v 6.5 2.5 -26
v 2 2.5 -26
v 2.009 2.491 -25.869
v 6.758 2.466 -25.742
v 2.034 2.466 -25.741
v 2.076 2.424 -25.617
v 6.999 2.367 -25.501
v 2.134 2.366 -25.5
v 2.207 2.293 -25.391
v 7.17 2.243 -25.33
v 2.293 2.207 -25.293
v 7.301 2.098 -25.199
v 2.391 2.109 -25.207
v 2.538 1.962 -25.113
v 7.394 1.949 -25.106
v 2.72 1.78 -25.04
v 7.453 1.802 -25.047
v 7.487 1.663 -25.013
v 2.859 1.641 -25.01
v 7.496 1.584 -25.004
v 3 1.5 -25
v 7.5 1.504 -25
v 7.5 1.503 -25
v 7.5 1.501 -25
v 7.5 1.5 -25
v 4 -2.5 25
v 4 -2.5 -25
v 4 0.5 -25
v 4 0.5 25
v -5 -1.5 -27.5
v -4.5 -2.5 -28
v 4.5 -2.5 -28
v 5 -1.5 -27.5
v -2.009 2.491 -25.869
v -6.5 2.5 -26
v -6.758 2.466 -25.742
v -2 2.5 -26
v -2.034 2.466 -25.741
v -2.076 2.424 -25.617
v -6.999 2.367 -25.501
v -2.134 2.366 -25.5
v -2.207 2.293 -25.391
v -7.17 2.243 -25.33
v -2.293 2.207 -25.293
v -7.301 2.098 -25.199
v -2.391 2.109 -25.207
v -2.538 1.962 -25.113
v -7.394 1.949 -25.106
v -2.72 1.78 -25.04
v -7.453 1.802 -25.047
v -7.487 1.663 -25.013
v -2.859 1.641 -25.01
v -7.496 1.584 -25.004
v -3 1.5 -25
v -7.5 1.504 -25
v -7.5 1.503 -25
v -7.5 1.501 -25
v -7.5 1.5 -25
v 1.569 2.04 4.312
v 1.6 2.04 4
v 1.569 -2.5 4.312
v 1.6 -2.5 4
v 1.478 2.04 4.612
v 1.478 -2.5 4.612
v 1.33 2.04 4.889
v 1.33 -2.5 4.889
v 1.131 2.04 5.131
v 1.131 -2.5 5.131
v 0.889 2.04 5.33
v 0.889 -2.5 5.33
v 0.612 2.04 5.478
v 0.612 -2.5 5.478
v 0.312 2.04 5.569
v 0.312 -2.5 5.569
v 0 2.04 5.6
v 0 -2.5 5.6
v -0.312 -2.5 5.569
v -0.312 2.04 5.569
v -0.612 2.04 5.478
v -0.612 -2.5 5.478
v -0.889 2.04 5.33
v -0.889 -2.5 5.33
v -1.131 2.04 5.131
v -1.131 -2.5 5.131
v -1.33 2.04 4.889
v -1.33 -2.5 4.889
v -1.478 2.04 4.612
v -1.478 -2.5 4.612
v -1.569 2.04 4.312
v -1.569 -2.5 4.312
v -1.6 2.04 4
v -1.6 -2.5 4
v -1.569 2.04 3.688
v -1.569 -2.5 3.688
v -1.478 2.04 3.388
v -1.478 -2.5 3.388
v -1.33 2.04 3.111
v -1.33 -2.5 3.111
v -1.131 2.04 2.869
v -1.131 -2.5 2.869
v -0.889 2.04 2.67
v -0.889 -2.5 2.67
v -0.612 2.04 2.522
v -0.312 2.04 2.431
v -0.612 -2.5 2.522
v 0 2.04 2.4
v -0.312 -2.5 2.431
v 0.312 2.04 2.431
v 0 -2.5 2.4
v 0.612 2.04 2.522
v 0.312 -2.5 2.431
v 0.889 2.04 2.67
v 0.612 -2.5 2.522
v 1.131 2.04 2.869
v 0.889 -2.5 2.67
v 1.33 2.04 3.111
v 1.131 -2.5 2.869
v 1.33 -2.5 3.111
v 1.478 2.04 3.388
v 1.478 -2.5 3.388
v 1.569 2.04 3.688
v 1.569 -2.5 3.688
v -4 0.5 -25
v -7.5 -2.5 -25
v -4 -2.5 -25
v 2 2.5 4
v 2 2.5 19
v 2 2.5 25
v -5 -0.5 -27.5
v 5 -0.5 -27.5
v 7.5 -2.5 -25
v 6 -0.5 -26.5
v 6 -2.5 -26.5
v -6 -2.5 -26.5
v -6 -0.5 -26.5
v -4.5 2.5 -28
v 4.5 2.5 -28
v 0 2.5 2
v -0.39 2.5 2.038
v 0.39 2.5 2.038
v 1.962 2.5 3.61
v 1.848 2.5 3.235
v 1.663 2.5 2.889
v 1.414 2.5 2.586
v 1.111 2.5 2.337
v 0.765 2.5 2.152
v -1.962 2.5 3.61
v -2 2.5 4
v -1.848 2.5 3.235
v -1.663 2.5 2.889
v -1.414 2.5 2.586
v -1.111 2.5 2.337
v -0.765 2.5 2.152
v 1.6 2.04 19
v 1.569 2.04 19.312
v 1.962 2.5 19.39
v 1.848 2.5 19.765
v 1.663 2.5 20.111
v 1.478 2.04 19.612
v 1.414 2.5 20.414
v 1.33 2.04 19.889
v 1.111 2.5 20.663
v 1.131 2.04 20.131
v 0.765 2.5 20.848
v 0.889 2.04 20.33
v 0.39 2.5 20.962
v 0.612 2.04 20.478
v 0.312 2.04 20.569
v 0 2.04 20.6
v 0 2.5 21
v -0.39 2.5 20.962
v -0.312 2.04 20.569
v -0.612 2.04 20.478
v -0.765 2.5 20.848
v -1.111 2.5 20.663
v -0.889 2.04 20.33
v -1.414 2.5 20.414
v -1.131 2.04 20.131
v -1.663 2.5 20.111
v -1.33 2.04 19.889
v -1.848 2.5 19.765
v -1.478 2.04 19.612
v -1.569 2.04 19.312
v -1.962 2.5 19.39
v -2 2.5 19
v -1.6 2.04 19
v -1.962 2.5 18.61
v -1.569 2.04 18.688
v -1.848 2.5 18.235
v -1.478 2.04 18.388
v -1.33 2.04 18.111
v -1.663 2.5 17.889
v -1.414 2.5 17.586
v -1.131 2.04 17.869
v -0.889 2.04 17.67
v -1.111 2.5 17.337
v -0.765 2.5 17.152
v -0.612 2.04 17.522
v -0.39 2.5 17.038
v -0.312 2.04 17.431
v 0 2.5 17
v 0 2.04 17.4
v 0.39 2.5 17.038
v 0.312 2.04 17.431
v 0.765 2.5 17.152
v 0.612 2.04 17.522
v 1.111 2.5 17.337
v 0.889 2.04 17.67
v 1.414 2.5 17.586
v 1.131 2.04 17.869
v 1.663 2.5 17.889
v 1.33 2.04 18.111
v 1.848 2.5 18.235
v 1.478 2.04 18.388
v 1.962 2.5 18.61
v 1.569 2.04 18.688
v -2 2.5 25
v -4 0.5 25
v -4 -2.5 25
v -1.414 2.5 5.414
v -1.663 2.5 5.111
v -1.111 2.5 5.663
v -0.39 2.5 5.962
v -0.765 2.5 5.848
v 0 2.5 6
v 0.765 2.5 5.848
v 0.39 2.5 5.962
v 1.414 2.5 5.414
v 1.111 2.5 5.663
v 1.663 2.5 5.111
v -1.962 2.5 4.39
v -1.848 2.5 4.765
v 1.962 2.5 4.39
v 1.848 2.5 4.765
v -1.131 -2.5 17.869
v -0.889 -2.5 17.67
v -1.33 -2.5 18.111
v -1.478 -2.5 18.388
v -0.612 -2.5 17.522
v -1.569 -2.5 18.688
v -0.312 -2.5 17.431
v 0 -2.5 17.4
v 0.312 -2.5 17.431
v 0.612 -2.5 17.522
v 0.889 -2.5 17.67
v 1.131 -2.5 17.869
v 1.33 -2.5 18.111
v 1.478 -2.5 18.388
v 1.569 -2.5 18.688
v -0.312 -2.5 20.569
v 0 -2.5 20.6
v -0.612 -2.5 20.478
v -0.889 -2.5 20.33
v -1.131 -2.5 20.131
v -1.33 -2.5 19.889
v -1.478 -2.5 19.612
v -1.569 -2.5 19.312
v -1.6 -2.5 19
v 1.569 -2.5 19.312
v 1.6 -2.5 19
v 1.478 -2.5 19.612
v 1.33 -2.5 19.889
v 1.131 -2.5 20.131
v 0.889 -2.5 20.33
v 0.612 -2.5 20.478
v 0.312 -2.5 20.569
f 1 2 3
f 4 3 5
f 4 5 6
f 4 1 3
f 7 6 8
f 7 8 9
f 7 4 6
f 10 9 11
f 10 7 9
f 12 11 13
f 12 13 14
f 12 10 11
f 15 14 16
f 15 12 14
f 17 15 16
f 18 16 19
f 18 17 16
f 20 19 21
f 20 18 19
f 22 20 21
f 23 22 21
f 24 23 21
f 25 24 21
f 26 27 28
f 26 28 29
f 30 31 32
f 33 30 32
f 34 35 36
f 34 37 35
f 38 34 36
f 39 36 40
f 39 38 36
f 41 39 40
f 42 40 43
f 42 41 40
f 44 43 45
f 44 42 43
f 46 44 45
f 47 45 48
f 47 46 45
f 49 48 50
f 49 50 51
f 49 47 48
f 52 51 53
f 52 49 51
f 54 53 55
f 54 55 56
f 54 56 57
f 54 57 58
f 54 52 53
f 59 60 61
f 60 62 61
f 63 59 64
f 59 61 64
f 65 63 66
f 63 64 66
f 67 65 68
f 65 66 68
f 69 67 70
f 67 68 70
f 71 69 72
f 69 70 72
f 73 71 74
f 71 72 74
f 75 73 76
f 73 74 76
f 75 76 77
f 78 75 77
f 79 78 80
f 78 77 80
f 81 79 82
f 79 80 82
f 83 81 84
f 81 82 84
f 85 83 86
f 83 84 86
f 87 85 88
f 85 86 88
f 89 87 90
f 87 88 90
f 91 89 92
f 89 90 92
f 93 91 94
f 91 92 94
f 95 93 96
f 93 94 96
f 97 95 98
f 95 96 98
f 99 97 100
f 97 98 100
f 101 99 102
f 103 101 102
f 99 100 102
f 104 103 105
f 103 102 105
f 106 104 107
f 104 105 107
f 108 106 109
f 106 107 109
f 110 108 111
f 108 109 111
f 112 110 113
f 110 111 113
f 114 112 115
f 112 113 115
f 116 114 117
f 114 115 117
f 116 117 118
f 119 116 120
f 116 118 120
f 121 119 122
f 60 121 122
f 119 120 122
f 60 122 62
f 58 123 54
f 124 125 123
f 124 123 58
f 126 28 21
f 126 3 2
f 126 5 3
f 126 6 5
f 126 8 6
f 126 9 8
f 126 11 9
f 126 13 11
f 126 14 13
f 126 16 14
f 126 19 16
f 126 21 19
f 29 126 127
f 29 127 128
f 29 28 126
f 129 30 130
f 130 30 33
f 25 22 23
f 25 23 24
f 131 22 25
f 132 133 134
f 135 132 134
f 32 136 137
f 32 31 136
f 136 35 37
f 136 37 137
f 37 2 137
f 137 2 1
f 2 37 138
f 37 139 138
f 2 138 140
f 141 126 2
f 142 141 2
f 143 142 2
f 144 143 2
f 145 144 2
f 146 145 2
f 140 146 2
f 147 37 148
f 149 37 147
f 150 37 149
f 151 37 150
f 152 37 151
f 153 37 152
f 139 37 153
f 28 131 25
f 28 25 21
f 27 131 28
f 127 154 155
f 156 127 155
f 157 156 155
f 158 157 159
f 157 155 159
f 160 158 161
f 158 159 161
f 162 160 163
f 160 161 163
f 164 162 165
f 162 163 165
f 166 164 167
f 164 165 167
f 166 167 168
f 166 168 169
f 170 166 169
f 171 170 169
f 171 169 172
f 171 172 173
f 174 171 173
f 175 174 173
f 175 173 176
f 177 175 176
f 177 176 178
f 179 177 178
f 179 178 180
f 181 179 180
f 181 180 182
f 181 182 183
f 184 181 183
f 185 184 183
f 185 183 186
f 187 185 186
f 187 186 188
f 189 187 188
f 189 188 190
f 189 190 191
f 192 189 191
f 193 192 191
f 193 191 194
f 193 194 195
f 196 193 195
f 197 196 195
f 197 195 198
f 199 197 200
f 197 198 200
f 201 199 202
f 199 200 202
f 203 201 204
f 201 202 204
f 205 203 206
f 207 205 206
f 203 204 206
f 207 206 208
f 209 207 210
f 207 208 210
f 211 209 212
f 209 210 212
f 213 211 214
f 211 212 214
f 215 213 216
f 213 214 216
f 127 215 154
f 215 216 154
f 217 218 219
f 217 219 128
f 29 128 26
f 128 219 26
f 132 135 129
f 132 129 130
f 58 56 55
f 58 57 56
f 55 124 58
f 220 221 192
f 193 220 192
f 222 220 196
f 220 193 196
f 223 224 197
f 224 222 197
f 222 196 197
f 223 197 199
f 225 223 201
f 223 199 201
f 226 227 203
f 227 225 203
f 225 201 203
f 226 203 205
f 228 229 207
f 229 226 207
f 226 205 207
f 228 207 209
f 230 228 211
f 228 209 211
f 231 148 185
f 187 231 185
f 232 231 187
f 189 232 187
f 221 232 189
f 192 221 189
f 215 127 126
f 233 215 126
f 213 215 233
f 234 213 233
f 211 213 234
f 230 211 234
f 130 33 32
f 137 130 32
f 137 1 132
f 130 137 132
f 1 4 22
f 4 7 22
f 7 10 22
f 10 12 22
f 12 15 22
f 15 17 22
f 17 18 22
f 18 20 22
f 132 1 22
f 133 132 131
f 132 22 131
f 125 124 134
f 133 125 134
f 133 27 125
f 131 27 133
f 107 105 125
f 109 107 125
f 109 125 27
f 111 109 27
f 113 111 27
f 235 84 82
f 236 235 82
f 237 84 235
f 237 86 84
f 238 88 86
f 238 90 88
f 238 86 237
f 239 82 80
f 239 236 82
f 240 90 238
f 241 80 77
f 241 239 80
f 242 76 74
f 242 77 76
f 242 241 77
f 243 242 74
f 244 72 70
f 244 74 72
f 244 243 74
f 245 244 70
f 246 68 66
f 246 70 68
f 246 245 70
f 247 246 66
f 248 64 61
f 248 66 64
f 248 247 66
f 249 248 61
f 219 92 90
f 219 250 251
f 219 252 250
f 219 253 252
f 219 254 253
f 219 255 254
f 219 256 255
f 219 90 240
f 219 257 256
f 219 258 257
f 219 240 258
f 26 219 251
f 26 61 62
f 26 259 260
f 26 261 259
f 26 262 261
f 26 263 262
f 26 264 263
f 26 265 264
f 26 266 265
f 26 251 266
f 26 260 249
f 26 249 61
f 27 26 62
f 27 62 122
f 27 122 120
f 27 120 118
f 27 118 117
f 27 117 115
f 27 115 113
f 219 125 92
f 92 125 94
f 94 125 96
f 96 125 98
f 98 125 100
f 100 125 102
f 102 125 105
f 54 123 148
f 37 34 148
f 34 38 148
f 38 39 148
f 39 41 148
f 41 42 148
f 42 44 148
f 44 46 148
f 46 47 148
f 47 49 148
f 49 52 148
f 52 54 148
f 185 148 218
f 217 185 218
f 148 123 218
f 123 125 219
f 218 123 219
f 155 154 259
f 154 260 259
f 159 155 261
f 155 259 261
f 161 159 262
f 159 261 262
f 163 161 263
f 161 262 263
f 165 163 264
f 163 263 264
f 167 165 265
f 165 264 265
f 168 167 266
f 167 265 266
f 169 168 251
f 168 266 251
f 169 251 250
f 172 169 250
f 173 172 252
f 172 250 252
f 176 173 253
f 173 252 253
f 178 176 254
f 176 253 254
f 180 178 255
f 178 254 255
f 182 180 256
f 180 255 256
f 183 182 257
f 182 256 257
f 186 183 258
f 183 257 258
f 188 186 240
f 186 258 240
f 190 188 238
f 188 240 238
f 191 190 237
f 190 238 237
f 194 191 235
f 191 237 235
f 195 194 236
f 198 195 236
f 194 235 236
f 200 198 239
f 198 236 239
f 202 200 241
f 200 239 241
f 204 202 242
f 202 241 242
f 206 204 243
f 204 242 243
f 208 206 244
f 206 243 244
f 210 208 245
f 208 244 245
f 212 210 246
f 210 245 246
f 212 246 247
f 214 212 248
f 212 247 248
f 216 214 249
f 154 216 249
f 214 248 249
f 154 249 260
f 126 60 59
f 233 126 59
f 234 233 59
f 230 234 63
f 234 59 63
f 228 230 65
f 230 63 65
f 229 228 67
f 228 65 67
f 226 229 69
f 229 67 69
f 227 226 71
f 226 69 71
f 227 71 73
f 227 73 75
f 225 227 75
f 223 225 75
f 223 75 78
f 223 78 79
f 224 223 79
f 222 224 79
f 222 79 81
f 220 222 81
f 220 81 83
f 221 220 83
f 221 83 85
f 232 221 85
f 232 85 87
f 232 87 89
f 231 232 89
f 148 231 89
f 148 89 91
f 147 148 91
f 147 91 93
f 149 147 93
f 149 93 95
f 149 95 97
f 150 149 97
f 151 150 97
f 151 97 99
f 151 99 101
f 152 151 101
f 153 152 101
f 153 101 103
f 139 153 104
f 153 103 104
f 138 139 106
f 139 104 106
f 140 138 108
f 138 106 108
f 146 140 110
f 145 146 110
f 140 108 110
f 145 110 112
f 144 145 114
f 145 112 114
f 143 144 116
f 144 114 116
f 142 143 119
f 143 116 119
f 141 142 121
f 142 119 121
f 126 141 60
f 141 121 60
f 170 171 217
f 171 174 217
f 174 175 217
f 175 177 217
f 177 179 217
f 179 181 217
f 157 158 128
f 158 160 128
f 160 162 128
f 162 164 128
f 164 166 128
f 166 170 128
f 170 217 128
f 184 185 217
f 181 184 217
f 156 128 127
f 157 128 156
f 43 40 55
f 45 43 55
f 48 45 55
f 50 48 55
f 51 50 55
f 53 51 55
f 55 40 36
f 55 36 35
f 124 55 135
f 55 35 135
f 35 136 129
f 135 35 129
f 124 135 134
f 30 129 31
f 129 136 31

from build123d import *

# Parameters (mm, degrees)
F0_W           = 8
F0_H           = 50
F1_DEPTH       = 2.5
F2_W           = 15
F2_H           = 1
F2_W_2         = 0.5
F3_DEPTH       = 2
F4_SIZE        = 2.99999
F5_SIZE        = 2
F6_SIZE2       = 0.49999
F6_SIZE        = 0.99999
F7_R           = 1
F9_D           = 3.2
F9_CSINK_D     = 4
F9_CSINK_ANGLE = 82


# Not quite as in the source:
# - a fillet or chamfer is up to 0.001 mm smaller than in the source, because OpenCascade refuses the exact size


with BuildPart() as f1:
    # F0 (on Front) → F1 (new body, symmetric)
    with BuildSketch(Plane.XZ):
        Rectangle(F0_W, F0_H)
        Polygon((7.5, -25), (4, -25), (-4, -25), (-7.5, -25), (-7.5, -28), (7.5, -28), align=None)
    extrude(amount=F1_DEPTH, both=True)

    # F2 (on face) → F3 (cut)
    with BuildSketch(Plane.XZ.offset(2.5)):
        with Locations((0, -27)):
            Rectangle(F2_W, F2_H)
        with Locations((-7.75, -27)):
            Rectangle(F2_W_2, F2_H)
        with Locations((7.75, -27)):
            Rectangle(F2_W_2, F2_H)
    extrude(amount=-F3_DEPTH, mode=Mode.SUBTRACT)

    # F4 (size 3 in the source; OpenCascade refuses exactly that, so slightly less here)
    f4_edges = [f1.edges().sort_by_distance(p)[0] for p in [
        (-7.5, 0, -28),
        (7.5, 0, -28),
    ]]
    chamfer(f4_edges, length=F4_SIZE)

    # F5
    f5_edges = [f1.edges().sort_by_distance(p)[0] for p in [
        (-4, 2.5, 0),
        (4, 2.5, 0),
    ]]
    chamfer(f5_edges, length=F5_SIZE)

    # F6 (size 1 and 0.5 in the source; OpenCascade refuses exactly that, so slightly less here)
    f6_edges = [f1.edges().sort_by_distance(p)[0] for p in [
        (0, -2.5, -27.5),
    ]]
    f6_side = f1.faces().sort_by_distance((0, -1.5, -27.5))[0]
    chamfer(f6_edges, length=F6_SIZE, length2=F6_SIZE2, reference=f6_side)

    # F7
    f7_edges = [f1.edges().sort_by_distance(p)[0] for p in [
        (-5.75, 2.5, -25),
        (5.75, 2.5, -25),
    ]]
    fillet(f7_edges, radius=F7_R)

    # F9 (through all)
    with Locations(Plane(origin=(0, 2.5, 0), x_dir=(-1, 0, 0), z_dir=(0, 1, 0))):
        with Locations((0, 19), (0, 4)):
            CounterSinkHole(F9_D / 2, F9_CSINK_D / 2, counter_sink_angle=F9_CSINK_ANGLE)


solid = f1.part
